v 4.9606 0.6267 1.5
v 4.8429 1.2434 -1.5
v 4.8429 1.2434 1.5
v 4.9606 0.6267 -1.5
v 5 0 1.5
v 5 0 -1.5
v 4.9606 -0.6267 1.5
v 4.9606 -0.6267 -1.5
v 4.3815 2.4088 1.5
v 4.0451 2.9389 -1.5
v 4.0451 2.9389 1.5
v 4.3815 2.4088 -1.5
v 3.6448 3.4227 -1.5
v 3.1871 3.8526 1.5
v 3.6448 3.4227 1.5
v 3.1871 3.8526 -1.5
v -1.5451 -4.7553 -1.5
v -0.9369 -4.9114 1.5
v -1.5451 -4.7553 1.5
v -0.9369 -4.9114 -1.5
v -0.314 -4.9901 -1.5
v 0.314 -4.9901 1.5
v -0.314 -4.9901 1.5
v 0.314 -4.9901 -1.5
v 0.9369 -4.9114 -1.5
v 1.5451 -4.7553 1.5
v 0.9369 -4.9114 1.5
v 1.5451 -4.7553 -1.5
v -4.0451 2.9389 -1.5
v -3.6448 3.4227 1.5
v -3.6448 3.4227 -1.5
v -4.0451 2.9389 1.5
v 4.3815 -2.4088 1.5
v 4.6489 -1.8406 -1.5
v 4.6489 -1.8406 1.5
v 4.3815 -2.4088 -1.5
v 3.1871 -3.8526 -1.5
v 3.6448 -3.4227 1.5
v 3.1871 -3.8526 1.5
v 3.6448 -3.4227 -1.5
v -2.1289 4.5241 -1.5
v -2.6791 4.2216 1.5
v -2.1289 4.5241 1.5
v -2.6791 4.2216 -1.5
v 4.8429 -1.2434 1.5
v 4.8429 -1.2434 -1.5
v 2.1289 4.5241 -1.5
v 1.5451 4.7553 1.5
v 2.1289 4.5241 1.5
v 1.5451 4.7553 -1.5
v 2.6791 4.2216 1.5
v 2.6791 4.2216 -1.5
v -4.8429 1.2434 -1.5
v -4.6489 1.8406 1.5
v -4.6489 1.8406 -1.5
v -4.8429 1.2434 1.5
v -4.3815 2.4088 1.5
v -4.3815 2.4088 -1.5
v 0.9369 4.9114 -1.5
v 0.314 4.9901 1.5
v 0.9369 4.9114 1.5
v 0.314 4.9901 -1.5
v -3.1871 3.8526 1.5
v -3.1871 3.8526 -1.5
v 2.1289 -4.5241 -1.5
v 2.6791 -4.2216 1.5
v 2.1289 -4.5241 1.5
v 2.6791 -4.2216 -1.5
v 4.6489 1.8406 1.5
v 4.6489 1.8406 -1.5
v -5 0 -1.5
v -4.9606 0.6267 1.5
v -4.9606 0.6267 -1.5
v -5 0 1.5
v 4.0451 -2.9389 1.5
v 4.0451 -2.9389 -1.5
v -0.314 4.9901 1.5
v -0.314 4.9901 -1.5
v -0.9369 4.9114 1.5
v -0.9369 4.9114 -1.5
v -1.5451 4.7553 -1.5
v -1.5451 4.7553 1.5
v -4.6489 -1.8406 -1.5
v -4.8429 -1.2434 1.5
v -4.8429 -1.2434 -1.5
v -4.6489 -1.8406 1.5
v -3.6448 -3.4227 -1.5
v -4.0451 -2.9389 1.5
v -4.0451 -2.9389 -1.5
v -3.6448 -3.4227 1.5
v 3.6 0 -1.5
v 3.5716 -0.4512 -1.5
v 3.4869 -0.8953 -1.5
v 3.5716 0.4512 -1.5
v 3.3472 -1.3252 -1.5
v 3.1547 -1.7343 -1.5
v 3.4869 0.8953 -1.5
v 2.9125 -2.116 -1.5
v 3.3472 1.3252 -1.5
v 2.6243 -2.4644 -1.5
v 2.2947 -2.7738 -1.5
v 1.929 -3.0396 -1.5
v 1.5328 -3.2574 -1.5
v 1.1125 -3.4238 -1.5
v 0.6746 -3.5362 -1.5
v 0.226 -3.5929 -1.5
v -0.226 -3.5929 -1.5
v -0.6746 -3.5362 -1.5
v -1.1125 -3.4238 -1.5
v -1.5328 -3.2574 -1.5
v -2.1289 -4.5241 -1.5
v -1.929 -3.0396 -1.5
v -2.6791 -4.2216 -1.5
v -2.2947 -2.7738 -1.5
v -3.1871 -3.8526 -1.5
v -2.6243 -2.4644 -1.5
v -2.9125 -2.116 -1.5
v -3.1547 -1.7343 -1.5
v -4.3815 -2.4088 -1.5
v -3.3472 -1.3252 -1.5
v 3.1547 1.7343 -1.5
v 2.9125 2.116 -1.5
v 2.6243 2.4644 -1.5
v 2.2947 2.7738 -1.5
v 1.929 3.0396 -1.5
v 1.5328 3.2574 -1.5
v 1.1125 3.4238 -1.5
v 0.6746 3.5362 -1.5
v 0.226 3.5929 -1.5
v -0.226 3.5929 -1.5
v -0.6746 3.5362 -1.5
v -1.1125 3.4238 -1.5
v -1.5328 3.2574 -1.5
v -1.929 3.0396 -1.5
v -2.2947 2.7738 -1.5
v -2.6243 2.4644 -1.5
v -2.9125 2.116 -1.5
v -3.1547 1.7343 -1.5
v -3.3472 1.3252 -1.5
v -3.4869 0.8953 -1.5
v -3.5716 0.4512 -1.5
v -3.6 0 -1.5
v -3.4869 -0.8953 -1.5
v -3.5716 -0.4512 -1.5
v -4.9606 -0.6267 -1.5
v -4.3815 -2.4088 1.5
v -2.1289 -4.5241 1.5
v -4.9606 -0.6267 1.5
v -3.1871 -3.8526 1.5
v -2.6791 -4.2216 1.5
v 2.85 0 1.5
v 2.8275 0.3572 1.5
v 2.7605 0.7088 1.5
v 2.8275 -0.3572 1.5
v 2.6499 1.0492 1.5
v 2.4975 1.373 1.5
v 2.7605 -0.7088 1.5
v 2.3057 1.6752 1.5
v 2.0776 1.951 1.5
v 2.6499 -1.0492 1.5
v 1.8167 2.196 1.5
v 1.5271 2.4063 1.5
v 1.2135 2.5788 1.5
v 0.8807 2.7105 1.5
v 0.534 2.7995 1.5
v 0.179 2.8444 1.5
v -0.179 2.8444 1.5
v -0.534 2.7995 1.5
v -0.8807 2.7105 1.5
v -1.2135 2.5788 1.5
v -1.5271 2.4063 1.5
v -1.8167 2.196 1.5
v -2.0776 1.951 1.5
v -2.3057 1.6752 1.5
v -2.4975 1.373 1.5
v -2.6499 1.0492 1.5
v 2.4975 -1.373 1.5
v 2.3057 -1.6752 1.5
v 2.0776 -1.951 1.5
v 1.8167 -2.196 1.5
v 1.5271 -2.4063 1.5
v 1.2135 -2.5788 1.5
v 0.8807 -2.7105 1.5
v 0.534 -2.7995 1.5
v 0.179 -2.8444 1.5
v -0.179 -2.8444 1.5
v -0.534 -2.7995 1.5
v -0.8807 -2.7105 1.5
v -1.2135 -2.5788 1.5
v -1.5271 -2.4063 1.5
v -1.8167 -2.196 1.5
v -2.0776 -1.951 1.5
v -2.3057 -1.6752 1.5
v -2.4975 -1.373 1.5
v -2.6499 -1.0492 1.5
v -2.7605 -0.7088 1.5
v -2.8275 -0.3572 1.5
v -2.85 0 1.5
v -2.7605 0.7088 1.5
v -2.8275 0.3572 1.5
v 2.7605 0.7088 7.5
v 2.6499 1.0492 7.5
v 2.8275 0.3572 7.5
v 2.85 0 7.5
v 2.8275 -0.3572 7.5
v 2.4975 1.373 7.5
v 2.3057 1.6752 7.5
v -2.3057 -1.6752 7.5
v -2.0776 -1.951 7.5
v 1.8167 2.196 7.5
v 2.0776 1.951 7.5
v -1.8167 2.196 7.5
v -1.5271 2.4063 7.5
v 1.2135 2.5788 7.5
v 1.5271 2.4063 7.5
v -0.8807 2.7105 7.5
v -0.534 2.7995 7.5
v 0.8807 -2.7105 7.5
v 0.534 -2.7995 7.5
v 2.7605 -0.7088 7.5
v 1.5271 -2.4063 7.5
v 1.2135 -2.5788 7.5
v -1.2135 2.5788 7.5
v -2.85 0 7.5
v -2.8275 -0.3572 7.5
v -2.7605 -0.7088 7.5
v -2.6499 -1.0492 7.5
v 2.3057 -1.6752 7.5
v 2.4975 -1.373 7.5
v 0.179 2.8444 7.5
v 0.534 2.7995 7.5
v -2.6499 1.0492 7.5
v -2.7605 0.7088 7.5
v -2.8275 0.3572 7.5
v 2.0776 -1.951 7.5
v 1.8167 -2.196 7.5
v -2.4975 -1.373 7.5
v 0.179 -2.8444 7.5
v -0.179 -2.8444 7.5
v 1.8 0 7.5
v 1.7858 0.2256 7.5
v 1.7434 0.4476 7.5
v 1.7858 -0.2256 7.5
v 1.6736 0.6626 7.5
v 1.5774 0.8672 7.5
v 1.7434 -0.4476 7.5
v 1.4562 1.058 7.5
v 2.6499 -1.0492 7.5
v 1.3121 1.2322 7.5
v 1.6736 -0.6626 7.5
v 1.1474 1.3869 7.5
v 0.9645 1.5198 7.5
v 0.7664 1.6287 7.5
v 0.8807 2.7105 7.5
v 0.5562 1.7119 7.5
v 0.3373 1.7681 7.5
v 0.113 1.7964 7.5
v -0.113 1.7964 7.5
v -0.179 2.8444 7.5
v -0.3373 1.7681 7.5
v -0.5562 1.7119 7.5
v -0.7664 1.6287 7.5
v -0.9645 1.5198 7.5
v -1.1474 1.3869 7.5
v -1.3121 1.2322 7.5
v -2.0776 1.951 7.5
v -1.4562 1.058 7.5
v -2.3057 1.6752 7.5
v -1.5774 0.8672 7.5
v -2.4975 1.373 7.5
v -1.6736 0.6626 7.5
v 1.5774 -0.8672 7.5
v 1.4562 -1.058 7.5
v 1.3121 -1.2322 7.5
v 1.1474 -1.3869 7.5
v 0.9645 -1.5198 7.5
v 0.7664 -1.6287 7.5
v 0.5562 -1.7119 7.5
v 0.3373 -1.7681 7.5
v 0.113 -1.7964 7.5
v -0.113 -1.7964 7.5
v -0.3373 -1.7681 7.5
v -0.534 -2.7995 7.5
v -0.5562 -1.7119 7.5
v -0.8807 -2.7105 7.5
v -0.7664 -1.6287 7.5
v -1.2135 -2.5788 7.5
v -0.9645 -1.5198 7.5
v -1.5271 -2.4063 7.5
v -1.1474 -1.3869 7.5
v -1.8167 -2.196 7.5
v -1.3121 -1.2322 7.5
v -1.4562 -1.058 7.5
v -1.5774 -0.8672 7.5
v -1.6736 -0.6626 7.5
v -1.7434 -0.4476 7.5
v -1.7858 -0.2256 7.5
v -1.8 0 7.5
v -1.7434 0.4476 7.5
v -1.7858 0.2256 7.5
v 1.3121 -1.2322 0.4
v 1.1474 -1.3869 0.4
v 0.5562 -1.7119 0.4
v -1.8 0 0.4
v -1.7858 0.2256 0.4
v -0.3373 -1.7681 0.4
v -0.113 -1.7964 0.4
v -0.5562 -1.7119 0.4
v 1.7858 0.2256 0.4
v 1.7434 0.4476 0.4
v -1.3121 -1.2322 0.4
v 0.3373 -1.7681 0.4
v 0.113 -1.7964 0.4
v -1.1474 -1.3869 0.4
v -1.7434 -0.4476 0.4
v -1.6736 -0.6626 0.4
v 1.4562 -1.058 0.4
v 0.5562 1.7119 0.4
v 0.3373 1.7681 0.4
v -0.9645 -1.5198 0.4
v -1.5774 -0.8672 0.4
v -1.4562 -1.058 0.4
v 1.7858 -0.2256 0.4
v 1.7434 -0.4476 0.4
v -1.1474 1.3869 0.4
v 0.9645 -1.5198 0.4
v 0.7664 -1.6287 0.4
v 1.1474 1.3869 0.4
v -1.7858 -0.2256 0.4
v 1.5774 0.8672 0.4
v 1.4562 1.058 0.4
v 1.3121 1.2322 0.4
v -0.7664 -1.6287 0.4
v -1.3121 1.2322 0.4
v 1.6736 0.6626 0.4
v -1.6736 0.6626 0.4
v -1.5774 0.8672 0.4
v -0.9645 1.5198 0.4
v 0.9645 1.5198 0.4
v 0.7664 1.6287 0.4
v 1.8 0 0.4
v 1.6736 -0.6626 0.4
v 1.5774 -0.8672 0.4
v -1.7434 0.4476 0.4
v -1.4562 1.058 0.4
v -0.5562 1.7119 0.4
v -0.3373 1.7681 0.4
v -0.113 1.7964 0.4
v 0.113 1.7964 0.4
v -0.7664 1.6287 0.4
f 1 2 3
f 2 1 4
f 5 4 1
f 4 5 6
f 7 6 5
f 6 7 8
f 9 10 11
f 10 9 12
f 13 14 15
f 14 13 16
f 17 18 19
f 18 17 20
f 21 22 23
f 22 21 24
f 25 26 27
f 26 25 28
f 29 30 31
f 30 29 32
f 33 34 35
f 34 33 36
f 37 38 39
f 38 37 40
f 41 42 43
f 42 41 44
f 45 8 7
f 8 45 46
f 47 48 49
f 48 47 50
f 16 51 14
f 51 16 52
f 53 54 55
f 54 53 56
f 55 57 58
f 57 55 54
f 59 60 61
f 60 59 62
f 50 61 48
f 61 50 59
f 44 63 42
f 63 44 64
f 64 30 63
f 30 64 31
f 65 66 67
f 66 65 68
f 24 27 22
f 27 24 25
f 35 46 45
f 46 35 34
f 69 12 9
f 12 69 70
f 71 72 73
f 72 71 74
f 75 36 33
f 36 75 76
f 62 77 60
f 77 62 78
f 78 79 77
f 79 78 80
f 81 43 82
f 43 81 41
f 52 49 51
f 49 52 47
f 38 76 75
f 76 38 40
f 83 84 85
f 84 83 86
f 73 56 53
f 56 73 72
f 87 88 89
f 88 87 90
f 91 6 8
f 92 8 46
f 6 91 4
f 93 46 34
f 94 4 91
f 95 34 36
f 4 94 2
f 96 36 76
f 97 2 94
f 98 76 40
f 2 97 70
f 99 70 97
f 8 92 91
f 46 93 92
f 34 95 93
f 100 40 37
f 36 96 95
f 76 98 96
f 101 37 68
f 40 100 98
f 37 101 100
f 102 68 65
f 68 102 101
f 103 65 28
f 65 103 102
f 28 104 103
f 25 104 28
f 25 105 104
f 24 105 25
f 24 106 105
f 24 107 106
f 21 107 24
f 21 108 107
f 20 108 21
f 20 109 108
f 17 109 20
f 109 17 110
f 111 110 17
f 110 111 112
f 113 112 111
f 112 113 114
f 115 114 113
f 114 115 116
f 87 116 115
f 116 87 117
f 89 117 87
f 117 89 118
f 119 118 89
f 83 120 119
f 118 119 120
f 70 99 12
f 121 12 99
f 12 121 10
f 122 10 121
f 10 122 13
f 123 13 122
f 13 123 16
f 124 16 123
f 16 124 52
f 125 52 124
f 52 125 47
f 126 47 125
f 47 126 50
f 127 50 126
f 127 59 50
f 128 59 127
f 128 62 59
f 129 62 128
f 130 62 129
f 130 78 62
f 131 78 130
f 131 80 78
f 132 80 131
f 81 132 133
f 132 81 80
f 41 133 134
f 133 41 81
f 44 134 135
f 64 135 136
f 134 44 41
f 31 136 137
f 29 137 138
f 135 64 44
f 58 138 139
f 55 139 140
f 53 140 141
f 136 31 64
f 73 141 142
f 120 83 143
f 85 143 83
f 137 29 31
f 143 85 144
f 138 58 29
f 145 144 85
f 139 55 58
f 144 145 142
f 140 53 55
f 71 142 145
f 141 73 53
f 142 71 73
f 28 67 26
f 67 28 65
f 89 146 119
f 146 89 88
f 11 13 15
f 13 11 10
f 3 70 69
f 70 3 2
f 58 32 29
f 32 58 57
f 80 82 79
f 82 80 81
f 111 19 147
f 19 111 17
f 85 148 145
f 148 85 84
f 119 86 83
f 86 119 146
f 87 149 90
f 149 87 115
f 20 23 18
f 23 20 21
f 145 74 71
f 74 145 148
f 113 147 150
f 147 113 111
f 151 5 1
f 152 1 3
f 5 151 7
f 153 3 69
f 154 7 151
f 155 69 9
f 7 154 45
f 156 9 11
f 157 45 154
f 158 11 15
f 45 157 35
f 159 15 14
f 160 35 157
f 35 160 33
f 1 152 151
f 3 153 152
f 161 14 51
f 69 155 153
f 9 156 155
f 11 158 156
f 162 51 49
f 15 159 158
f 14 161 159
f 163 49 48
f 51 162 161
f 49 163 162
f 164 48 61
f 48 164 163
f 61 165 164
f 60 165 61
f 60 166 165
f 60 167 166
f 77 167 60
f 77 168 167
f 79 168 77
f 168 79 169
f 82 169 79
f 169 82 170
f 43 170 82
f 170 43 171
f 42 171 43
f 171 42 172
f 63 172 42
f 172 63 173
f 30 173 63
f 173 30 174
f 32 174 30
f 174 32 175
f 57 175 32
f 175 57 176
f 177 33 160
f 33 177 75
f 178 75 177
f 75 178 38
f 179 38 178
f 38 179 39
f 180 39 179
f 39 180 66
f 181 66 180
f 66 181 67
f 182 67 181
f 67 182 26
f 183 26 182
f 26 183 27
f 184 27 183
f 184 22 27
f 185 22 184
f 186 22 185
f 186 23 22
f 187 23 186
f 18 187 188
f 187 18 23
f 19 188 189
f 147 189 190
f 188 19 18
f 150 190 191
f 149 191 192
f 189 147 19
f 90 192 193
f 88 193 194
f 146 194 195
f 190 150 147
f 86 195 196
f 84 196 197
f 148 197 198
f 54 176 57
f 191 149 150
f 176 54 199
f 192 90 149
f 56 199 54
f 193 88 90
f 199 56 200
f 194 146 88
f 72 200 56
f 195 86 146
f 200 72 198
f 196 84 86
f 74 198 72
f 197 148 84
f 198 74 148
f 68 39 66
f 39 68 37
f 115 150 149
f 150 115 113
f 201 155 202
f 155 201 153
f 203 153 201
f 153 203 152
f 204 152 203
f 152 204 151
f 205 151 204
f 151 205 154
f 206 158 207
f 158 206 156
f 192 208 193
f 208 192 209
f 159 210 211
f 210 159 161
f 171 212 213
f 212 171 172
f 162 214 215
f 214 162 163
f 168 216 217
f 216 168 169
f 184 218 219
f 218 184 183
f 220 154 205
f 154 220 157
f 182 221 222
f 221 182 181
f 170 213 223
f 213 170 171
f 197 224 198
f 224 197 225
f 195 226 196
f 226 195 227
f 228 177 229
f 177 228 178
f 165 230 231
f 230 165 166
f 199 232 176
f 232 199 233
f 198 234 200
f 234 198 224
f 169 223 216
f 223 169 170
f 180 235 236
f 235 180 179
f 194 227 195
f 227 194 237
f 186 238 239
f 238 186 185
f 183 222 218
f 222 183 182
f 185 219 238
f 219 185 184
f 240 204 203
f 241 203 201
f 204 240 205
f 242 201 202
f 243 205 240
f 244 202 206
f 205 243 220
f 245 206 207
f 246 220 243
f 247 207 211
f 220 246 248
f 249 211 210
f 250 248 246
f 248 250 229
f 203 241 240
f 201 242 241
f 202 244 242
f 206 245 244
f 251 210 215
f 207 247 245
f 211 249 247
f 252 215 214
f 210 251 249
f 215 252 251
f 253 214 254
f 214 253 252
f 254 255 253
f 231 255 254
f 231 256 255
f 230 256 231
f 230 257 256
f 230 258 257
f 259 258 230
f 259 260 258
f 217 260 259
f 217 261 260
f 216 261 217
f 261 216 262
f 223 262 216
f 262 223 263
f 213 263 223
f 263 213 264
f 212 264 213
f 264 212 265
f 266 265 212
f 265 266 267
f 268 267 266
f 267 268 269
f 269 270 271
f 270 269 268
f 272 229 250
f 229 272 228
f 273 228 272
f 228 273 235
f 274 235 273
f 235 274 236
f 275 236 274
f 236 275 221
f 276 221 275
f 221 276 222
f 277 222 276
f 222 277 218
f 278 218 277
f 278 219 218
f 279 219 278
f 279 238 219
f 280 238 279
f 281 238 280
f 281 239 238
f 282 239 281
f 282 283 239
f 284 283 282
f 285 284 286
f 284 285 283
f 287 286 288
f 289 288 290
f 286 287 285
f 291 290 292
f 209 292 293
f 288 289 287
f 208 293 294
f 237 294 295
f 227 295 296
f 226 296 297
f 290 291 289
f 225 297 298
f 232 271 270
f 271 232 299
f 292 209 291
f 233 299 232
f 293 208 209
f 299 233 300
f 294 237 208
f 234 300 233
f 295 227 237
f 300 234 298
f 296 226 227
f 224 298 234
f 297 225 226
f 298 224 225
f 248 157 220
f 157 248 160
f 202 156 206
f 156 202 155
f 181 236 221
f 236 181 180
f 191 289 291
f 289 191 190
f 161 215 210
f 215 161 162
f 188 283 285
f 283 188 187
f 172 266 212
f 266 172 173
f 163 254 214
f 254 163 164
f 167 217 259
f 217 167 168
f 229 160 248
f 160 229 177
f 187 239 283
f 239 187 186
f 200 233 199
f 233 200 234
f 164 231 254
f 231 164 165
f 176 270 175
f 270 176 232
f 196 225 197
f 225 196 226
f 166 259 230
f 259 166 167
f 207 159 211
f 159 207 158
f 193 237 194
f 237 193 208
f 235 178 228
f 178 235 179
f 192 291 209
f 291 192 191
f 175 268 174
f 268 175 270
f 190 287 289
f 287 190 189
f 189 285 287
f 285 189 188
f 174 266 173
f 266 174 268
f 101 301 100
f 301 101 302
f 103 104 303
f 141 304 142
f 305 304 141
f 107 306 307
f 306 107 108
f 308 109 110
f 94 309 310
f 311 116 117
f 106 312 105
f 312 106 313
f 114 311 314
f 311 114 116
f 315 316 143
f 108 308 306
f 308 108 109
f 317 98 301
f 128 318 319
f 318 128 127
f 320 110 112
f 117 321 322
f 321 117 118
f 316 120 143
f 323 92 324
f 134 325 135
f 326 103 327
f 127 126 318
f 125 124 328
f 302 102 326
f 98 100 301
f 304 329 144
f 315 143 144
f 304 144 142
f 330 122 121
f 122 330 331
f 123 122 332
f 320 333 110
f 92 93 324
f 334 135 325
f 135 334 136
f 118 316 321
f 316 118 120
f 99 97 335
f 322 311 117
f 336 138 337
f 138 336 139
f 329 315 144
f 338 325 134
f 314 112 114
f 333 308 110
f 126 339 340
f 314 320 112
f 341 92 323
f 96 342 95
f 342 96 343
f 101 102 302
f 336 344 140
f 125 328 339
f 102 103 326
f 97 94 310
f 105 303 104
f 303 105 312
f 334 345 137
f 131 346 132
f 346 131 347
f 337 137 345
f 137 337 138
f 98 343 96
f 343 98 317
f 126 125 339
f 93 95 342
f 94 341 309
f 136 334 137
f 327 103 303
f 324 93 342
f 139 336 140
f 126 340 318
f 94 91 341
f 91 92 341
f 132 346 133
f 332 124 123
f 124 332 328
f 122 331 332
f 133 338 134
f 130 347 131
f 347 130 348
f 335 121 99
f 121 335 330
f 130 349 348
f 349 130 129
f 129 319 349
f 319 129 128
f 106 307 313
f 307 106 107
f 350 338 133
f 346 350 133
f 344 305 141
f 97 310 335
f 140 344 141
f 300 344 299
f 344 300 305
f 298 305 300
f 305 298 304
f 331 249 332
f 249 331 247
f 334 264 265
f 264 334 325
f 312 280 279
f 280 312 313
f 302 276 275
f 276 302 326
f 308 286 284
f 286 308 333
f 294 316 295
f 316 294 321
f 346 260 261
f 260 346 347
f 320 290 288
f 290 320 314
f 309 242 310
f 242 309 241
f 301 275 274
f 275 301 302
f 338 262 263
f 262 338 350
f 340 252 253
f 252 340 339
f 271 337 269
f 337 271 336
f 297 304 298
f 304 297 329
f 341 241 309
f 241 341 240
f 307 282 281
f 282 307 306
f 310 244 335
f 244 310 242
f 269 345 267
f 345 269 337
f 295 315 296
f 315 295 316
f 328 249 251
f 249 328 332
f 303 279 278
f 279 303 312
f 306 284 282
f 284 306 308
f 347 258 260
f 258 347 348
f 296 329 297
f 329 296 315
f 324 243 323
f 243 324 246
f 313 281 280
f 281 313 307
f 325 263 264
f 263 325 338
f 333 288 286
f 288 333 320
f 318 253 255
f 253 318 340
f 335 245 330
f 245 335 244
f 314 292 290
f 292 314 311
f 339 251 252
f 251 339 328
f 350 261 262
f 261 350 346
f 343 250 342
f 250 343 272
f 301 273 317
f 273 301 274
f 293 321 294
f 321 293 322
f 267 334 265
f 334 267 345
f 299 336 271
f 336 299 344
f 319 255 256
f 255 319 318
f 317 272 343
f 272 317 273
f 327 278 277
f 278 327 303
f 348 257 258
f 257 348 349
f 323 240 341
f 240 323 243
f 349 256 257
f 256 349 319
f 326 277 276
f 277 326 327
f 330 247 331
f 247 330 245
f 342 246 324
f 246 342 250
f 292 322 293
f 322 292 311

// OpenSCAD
$fn = 50;


difference() {
	union() {
		translate(v = [0, 0, -1.5000000000]) {
			cylinder(h = 3, r = 5.0000000000);
		}
		translate(v = [0, 0, -1.5000000000]) {
			cylinder(h = 9, r = 2.8500000000);
		}
	}
	union() {
		translate(v = [0, 0, -1.5000000000]) {
			rotate(a = [0, 180, 0]) {
				difference() {
					union() {
						translate(v = [0, 0, -9.0000000000]) {
							cylinder(h = 9, r = 1.5000000000);
						}
						translate(v = [0, 0, -1.9000000000]) {
							cylinder(h = 1.9000000000, r1 = 1.8000000000, r2 = 3.6000000000);
						}
						translate(v = [0, 0, -9.0000000000]) {
							cylinder(h = 9, r = 1.8000000000);
						}
						translate(v = [0, 0, -9.0000000000]) {
							cylinder(h = 9, r = 1.5000000000);
						}
					}
					union();
				}
			}
		}
		translate(v = [0, 0, -100.0000000000]) {
			cylinder(h = 200, r = 1.8000000000);
		}
	}
}
